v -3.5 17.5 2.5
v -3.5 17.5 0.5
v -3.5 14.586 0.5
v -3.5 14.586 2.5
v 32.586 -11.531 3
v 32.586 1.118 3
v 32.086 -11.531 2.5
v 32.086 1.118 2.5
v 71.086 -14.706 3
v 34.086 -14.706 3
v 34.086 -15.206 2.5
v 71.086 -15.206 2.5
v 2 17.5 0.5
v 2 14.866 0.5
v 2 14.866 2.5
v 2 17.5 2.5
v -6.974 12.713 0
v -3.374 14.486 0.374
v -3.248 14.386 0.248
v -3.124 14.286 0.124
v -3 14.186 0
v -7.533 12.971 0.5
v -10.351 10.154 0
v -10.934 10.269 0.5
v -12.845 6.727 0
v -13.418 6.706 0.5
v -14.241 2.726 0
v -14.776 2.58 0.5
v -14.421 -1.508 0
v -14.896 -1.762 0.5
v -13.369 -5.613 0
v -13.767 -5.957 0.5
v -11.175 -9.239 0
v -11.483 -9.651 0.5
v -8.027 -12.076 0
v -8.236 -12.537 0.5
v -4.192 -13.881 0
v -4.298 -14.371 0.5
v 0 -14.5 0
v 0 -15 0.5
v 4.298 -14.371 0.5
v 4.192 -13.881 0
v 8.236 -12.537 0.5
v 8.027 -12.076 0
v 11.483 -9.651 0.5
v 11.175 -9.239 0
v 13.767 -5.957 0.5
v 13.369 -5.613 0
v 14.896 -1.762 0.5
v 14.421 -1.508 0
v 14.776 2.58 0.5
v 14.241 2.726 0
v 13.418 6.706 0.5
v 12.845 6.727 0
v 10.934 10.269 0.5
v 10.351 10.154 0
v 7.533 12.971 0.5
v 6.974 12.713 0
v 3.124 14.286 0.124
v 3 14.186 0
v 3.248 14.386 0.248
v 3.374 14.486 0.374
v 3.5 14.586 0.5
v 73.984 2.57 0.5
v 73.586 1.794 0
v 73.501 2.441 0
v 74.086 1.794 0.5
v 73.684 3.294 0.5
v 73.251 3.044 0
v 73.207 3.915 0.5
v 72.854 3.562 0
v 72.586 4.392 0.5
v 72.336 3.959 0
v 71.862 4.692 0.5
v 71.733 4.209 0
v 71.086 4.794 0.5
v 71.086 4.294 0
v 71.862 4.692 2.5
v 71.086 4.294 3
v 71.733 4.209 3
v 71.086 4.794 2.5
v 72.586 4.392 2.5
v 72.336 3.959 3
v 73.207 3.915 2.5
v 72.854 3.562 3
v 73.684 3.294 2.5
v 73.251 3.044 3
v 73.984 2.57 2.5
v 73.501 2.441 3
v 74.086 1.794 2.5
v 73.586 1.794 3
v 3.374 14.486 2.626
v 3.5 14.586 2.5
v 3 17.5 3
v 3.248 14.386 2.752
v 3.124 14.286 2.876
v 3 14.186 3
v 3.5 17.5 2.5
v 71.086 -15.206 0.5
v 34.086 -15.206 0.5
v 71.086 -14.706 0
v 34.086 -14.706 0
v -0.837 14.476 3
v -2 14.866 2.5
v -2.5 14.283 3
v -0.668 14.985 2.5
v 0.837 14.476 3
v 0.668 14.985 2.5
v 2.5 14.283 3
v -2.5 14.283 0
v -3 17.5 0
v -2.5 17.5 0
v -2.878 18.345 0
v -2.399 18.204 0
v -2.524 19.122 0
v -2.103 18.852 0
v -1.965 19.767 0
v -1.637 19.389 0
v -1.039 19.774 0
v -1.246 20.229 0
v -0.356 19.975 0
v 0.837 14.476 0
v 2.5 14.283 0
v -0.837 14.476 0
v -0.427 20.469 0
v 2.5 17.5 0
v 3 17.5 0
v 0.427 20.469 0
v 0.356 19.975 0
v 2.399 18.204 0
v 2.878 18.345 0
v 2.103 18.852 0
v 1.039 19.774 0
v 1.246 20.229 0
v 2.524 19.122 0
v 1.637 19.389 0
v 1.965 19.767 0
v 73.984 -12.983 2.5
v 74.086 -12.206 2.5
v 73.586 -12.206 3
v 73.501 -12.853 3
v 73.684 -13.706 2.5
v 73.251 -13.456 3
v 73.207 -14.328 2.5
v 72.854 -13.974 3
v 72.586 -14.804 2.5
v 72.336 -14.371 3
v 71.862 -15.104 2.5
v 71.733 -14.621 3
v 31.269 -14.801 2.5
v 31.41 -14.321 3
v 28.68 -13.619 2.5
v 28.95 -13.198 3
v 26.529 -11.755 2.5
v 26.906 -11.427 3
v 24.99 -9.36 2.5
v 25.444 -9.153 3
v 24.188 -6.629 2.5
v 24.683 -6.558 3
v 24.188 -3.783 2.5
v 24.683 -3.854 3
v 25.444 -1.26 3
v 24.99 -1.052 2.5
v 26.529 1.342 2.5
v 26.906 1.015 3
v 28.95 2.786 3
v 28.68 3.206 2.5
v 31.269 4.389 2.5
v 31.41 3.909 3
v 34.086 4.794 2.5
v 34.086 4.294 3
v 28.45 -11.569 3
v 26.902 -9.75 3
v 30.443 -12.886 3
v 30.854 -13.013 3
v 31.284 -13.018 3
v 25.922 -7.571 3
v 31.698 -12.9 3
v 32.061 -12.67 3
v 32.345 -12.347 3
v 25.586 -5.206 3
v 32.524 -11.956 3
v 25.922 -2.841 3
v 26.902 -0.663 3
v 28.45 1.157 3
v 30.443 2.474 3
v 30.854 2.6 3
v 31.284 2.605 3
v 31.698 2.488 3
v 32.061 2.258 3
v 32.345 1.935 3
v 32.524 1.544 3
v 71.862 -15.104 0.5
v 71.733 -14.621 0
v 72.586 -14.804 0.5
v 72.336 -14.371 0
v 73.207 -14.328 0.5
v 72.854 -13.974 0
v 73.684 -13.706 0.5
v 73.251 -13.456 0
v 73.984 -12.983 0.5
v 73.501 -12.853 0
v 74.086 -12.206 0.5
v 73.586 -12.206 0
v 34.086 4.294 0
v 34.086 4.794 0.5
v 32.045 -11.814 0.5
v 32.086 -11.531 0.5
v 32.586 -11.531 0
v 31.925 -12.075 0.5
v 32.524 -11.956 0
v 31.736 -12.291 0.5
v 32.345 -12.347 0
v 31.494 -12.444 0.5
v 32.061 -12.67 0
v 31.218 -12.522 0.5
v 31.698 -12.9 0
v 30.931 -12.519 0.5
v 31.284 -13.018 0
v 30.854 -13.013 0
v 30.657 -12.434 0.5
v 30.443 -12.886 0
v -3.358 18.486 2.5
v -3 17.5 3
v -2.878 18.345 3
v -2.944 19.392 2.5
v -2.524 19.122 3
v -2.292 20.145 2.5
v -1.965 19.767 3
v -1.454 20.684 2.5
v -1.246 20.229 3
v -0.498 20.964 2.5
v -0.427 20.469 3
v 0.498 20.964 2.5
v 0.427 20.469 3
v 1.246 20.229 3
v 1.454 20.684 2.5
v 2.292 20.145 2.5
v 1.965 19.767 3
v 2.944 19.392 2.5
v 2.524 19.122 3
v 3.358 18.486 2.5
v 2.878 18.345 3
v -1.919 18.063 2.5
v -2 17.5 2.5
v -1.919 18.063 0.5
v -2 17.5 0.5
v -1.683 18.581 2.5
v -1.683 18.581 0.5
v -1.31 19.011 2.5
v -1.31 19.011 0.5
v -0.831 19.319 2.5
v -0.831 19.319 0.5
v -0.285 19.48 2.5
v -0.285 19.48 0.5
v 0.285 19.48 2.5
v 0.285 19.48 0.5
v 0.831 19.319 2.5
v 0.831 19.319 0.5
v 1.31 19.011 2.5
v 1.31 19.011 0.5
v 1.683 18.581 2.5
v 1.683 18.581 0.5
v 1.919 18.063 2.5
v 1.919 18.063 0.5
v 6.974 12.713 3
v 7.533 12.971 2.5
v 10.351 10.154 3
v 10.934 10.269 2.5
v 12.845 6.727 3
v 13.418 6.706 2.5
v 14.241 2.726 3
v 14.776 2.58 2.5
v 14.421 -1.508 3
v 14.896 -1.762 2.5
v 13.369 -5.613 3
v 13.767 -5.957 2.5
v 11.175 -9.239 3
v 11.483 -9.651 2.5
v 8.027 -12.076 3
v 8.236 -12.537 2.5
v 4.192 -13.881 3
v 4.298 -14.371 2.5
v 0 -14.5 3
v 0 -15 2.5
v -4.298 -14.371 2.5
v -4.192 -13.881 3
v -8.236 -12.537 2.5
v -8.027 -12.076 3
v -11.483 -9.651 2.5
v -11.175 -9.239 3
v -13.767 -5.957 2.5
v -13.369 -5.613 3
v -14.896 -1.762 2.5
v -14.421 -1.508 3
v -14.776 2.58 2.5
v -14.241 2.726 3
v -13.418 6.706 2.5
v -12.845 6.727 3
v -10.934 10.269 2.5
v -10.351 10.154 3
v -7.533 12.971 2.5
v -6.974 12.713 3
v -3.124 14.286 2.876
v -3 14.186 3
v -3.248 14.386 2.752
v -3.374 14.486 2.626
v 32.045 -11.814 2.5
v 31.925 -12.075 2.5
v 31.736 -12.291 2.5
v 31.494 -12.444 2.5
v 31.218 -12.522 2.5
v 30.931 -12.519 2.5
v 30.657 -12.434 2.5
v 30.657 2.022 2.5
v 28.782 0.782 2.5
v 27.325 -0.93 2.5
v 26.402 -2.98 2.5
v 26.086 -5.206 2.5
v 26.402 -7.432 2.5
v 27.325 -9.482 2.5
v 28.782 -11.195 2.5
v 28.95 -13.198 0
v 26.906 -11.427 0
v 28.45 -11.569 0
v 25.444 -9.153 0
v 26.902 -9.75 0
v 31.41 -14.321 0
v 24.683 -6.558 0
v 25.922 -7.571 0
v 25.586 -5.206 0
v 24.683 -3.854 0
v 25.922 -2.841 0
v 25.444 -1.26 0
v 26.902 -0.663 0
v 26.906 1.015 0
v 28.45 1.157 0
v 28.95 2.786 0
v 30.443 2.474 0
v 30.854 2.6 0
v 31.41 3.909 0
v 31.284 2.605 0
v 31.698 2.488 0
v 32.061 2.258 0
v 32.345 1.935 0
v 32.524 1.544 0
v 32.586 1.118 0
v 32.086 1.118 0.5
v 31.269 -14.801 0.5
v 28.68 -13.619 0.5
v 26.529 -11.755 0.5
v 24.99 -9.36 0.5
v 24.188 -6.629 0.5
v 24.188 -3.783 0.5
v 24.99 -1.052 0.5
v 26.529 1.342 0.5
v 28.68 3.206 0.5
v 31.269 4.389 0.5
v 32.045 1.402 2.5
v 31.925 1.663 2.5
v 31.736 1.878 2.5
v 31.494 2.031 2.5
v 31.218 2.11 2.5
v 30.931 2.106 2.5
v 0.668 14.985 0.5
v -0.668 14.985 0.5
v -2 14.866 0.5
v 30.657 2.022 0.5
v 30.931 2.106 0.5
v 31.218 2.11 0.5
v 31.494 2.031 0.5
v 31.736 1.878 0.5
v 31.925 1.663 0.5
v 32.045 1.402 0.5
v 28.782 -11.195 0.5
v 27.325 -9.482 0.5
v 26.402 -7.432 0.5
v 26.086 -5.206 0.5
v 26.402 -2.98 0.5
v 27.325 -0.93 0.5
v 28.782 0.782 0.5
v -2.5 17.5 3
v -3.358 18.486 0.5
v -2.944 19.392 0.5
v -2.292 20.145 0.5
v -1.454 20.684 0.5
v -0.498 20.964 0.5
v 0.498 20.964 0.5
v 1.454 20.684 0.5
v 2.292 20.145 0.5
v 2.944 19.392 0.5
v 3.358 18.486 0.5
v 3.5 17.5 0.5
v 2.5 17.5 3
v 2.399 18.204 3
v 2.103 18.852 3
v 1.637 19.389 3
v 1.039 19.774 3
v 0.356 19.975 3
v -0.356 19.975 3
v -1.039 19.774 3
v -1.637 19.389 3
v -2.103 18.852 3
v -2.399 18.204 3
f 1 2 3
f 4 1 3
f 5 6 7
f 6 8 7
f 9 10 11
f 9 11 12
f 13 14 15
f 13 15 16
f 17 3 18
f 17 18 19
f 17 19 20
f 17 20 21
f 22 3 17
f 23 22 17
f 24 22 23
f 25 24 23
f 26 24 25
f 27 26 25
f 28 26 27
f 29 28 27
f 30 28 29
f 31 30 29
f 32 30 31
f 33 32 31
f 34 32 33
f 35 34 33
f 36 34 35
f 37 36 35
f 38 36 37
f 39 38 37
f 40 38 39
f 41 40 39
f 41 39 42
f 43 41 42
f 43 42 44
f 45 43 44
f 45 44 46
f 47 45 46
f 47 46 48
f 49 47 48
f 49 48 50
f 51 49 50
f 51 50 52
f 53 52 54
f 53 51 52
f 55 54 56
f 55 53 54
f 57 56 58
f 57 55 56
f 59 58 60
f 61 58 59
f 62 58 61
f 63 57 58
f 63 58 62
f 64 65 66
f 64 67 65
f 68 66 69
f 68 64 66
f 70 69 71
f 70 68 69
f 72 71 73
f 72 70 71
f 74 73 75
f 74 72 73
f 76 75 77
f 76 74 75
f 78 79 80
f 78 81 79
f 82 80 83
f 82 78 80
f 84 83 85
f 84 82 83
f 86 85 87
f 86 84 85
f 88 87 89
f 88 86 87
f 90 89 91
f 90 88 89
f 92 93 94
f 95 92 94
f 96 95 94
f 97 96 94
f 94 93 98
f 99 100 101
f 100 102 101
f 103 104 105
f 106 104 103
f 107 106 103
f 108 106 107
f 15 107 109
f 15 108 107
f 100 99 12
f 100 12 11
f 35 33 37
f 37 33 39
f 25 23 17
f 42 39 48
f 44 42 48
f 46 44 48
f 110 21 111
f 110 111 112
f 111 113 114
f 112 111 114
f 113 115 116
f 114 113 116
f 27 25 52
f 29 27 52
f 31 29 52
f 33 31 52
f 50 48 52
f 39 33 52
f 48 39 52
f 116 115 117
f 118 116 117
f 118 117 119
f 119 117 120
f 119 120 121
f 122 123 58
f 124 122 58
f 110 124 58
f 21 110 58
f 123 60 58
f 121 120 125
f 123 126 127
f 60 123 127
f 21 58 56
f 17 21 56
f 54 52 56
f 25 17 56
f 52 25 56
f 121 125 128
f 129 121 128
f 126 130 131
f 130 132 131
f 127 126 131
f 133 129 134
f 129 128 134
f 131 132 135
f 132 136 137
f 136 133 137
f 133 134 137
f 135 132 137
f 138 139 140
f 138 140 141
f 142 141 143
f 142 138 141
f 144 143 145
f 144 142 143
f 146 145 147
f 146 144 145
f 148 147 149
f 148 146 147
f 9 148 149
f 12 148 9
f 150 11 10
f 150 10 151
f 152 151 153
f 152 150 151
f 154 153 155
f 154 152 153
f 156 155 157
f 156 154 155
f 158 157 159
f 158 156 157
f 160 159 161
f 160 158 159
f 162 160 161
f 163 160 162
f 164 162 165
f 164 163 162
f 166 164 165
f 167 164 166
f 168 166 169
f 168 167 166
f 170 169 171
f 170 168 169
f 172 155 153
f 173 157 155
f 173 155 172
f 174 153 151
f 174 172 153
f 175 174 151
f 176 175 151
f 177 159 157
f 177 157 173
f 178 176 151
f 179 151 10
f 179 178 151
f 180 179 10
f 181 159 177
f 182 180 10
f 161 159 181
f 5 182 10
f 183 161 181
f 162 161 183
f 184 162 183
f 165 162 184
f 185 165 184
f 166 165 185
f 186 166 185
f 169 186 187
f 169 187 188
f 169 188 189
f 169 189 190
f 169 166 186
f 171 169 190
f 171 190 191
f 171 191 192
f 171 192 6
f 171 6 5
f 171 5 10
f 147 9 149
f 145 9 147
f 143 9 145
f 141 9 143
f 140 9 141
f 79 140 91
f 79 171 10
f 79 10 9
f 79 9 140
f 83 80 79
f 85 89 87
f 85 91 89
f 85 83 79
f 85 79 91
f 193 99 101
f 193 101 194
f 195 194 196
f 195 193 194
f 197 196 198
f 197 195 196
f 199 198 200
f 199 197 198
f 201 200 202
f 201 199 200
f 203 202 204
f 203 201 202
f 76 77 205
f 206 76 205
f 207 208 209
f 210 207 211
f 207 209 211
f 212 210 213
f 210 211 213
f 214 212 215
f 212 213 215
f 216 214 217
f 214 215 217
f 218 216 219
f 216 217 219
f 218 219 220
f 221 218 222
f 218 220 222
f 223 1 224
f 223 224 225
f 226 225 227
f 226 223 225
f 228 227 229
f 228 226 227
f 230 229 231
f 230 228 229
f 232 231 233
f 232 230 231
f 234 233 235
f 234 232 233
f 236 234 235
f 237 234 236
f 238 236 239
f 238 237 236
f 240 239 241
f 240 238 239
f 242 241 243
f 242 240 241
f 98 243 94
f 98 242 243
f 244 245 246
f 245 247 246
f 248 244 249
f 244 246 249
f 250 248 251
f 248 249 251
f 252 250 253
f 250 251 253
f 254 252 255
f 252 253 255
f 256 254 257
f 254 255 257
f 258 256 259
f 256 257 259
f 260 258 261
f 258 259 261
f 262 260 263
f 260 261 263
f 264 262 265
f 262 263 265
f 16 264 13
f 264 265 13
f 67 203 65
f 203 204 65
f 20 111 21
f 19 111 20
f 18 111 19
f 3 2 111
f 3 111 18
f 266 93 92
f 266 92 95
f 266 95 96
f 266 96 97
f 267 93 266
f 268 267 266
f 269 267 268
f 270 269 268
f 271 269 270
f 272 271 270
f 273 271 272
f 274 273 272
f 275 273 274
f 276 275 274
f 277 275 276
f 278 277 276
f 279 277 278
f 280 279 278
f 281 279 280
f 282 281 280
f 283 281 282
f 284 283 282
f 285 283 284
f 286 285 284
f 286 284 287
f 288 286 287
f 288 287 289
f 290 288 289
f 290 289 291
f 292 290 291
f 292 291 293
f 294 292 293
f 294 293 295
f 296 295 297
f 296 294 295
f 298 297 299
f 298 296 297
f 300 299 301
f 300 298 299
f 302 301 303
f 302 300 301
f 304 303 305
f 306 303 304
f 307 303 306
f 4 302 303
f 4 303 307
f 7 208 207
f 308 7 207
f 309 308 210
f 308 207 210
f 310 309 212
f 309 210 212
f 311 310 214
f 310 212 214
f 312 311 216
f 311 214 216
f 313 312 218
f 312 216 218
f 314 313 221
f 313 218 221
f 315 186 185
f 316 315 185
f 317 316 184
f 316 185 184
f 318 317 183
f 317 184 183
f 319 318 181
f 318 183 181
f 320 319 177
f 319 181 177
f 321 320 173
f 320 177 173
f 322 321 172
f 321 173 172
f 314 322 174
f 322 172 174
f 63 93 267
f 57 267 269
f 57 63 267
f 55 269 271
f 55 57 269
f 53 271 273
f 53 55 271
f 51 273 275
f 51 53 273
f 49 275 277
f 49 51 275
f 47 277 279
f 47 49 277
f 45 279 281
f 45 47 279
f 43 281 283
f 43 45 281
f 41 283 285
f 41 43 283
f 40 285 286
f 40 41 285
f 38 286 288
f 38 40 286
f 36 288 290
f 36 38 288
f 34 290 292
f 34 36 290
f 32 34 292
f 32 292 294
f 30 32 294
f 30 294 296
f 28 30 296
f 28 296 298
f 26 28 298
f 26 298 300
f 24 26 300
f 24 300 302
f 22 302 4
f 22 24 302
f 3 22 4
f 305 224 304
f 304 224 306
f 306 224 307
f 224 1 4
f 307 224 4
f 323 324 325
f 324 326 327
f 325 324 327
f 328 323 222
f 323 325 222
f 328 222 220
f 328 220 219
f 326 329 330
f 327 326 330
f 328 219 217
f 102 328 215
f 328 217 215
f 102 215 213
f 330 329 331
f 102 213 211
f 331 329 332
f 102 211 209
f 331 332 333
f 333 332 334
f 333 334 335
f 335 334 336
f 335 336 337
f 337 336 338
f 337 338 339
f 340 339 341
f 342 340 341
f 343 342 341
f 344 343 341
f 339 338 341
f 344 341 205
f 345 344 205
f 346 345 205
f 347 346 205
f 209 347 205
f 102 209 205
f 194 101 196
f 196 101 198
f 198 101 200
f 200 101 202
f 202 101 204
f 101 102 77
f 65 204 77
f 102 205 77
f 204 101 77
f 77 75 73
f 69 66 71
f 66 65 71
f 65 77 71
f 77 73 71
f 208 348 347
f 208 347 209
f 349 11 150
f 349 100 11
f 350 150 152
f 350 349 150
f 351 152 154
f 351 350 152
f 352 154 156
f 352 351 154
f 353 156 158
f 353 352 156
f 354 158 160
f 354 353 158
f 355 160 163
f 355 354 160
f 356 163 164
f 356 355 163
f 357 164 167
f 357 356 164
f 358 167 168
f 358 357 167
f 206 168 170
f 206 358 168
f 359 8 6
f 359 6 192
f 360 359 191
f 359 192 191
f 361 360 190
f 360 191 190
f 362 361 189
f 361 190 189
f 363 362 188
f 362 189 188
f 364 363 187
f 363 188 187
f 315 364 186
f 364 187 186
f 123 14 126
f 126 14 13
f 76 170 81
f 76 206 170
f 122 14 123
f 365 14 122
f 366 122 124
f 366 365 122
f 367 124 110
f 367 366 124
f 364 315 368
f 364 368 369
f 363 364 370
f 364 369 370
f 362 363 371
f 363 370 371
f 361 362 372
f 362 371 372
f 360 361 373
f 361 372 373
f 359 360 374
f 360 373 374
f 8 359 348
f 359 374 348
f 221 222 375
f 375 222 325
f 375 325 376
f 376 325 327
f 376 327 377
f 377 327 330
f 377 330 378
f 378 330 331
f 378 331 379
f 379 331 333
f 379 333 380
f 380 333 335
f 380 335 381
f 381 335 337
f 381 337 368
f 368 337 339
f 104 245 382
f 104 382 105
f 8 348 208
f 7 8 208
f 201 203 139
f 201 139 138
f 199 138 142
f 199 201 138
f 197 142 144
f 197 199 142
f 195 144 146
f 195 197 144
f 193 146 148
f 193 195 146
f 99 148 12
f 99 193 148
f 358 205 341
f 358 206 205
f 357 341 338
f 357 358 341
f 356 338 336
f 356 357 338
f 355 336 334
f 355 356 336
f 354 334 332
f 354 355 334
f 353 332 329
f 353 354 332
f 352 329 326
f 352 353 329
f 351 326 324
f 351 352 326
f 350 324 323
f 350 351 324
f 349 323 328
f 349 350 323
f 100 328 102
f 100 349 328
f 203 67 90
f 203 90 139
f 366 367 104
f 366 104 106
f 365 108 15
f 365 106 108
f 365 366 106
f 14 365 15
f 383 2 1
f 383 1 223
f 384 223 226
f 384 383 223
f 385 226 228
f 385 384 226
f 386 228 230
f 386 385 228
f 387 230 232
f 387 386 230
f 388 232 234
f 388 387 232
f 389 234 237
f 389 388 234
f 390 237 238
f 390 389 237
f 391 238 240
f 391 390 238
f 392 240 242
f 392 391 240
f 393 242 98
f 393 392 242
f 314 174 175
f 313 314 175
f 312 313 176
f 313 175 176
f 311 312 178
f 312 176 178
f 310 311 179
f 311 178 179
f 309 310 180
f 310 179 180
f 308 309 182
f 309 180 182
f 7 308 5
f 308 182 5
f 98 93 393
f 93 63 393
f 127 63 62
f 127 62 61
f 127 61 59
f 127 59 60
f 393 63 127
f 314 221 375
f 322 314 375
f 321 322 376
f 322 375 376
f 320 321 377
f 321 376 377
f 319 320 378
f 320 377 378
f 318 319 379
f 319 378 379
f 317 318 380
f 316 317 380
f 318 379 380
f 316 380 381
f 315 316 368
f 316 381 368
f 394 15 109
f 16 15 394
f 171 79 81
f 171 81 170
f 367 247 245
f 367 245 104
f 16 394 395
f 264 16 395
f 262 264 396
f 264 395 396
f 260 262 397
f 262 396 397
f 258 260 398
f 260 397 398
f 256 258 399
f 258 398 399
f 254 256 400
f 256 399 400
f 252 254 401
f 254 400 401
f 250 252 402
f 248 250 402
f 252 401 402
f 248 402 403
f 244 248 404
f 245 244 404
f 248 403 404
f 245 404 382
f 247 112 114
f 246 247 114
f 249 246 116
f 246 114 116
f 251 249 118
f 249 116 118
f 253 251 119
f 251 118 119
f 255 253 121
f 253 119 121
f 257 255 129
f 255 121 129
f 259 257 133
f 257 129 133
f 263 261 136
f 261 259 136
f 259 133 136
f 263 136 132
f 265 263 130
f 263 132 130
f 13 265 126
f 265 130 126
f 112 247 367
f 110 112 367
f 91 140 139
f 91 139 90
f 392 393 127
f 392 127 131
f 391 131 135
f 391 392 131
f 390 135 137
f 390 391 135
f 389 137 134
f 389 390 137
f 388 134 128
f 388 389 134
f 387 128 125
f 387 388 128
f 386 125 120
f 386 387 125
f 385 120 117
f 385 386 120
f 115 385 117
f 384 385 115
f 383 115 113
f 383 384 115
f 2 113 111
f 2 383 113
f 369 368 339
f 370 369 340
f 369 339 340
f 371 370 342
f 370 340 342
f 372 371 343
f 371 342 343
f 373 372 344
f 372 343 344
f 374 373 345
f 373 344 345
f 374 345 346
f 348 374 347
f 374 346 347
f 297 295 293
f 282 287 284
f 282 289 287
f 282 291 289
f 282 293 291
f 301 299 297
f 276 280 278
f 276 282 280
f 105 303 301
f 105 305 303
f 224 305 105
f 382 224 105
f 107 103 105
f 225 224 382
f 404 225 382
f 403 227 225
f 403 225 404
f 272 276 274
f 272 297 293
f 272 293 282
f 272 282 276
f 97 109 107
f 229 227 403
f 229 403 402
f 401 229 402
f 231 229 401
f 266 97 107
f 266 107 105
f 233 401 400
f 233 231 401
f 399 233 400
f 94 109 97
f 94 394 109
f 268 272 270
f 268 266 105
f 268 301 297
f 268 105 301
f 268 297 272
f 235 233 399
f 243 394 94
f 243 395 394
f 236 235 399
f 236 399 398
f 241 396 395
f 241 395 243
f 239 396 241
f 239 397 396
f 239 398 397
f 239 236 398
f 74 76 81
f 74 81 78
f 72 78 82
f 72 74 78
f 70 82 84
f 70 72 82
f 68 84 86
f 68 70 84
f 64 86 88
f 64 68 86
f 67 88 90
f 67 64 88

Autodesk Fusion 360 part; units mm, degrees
sketch "Round Keychain" plane through (0, 0, 0) normal (0, 0, 1) x (1, 0, 0)
  circle A0 centre (0, 0) radius 15
  line L0 (3.5, 0) -> (3.5, 17.5)
  arc A1 (3.5, 17.5) -> (-3.5, 17.5) centre (0, 17.5) ccw
  line L1 (-3.5, 17.5) -> (-3.5, 0)
  arc A2 (-3.5, 0) -> (3.5, 0) centre (0, 0) ccw
  line L2 (0, 0) -> (0, 17.5) construction
  line L3 (2, 0) -> (2, 17.5)
  arc A3 (2, 17.5) -> (-2, 17.5) centre (0, 17.5) ccw
  line L4 (-2, 17.5) -> (-2, 0)
  arc A4 (-2, 0) -> (2, 0) centre (0, 0) ccw
  dimension "d1" = 30
  dimension "d2" = 7
  dimension "d3" = 17.5
  dimension "d4" = -1.5
extrude "Extrude1" add sketch "Round Keychain" along normal blind 3 contours A0 L0 L1 A2 | A0 L0 L1 A2 L3 L4 A4 | A0 L0 A1 L1 L3 A3 L4 | A0 L3 L4 A4 makes body 1
chamfer "Chamfer1" distance 0.5 angle 45 2 faces at (6.1413, -3.1139, 3) (-1.5532, -1.0825, 0) on bodies 1
sketch "Sketch2" plane through (0, 0, 0) normal (0, 0, 1) x (1, 0, 0)
  line L0 (34.086, 4.7938) -> (71.086, 4.7938)
  line L1 (74.086, 1.7938) -> (74.086, -12.2062)
  line L2 (71.086, -15.2062) -> (34.086, -15.2062)
  line L3 (34.086, 4.7938) -> (34.086, -15.2062)
  arc A0 (34.086, 4.7938) -> (34.086, -15.2062) centre (34.086, -5.2062) ccw
  line L4 (32.086, 1.1184) -> (32.086, -11.5307)
  arc A1 (30.6574, 2.0219) -> (30.6574, -12.4342) centre (34.086, -5.2062) ccw
  arc A2 (32.086, 1.1184) -> (30.6574, 2.0219) centre (31.086, 1.1184) ccw
  arc A3 (30.6574, -12.4342) -> (32.086, -11.5307) centre (31.086, -11.5307) ccw
  arc A4 (74.086, 1.7938) -> (71.086, 4.7938) centre (71.086, 1.7938) ccw
  arc A5 (71.086, -15.2062) -> (74.086, -12.2062) centre (71.086, -12.2062) ccw
  dimension "d10" = 20
  dimension "d13" = 1
  dimension "d14" = 3
extrude "Extrude2" add sketch "Sketch2" along normal blind 3 separate body makes body 2
chamfer "Chamfer2" distance 0.5 angle 45 2 faces at (58.7527, -8.5395, 0) (58.7527, -8.5395, 3) on bodies 2
